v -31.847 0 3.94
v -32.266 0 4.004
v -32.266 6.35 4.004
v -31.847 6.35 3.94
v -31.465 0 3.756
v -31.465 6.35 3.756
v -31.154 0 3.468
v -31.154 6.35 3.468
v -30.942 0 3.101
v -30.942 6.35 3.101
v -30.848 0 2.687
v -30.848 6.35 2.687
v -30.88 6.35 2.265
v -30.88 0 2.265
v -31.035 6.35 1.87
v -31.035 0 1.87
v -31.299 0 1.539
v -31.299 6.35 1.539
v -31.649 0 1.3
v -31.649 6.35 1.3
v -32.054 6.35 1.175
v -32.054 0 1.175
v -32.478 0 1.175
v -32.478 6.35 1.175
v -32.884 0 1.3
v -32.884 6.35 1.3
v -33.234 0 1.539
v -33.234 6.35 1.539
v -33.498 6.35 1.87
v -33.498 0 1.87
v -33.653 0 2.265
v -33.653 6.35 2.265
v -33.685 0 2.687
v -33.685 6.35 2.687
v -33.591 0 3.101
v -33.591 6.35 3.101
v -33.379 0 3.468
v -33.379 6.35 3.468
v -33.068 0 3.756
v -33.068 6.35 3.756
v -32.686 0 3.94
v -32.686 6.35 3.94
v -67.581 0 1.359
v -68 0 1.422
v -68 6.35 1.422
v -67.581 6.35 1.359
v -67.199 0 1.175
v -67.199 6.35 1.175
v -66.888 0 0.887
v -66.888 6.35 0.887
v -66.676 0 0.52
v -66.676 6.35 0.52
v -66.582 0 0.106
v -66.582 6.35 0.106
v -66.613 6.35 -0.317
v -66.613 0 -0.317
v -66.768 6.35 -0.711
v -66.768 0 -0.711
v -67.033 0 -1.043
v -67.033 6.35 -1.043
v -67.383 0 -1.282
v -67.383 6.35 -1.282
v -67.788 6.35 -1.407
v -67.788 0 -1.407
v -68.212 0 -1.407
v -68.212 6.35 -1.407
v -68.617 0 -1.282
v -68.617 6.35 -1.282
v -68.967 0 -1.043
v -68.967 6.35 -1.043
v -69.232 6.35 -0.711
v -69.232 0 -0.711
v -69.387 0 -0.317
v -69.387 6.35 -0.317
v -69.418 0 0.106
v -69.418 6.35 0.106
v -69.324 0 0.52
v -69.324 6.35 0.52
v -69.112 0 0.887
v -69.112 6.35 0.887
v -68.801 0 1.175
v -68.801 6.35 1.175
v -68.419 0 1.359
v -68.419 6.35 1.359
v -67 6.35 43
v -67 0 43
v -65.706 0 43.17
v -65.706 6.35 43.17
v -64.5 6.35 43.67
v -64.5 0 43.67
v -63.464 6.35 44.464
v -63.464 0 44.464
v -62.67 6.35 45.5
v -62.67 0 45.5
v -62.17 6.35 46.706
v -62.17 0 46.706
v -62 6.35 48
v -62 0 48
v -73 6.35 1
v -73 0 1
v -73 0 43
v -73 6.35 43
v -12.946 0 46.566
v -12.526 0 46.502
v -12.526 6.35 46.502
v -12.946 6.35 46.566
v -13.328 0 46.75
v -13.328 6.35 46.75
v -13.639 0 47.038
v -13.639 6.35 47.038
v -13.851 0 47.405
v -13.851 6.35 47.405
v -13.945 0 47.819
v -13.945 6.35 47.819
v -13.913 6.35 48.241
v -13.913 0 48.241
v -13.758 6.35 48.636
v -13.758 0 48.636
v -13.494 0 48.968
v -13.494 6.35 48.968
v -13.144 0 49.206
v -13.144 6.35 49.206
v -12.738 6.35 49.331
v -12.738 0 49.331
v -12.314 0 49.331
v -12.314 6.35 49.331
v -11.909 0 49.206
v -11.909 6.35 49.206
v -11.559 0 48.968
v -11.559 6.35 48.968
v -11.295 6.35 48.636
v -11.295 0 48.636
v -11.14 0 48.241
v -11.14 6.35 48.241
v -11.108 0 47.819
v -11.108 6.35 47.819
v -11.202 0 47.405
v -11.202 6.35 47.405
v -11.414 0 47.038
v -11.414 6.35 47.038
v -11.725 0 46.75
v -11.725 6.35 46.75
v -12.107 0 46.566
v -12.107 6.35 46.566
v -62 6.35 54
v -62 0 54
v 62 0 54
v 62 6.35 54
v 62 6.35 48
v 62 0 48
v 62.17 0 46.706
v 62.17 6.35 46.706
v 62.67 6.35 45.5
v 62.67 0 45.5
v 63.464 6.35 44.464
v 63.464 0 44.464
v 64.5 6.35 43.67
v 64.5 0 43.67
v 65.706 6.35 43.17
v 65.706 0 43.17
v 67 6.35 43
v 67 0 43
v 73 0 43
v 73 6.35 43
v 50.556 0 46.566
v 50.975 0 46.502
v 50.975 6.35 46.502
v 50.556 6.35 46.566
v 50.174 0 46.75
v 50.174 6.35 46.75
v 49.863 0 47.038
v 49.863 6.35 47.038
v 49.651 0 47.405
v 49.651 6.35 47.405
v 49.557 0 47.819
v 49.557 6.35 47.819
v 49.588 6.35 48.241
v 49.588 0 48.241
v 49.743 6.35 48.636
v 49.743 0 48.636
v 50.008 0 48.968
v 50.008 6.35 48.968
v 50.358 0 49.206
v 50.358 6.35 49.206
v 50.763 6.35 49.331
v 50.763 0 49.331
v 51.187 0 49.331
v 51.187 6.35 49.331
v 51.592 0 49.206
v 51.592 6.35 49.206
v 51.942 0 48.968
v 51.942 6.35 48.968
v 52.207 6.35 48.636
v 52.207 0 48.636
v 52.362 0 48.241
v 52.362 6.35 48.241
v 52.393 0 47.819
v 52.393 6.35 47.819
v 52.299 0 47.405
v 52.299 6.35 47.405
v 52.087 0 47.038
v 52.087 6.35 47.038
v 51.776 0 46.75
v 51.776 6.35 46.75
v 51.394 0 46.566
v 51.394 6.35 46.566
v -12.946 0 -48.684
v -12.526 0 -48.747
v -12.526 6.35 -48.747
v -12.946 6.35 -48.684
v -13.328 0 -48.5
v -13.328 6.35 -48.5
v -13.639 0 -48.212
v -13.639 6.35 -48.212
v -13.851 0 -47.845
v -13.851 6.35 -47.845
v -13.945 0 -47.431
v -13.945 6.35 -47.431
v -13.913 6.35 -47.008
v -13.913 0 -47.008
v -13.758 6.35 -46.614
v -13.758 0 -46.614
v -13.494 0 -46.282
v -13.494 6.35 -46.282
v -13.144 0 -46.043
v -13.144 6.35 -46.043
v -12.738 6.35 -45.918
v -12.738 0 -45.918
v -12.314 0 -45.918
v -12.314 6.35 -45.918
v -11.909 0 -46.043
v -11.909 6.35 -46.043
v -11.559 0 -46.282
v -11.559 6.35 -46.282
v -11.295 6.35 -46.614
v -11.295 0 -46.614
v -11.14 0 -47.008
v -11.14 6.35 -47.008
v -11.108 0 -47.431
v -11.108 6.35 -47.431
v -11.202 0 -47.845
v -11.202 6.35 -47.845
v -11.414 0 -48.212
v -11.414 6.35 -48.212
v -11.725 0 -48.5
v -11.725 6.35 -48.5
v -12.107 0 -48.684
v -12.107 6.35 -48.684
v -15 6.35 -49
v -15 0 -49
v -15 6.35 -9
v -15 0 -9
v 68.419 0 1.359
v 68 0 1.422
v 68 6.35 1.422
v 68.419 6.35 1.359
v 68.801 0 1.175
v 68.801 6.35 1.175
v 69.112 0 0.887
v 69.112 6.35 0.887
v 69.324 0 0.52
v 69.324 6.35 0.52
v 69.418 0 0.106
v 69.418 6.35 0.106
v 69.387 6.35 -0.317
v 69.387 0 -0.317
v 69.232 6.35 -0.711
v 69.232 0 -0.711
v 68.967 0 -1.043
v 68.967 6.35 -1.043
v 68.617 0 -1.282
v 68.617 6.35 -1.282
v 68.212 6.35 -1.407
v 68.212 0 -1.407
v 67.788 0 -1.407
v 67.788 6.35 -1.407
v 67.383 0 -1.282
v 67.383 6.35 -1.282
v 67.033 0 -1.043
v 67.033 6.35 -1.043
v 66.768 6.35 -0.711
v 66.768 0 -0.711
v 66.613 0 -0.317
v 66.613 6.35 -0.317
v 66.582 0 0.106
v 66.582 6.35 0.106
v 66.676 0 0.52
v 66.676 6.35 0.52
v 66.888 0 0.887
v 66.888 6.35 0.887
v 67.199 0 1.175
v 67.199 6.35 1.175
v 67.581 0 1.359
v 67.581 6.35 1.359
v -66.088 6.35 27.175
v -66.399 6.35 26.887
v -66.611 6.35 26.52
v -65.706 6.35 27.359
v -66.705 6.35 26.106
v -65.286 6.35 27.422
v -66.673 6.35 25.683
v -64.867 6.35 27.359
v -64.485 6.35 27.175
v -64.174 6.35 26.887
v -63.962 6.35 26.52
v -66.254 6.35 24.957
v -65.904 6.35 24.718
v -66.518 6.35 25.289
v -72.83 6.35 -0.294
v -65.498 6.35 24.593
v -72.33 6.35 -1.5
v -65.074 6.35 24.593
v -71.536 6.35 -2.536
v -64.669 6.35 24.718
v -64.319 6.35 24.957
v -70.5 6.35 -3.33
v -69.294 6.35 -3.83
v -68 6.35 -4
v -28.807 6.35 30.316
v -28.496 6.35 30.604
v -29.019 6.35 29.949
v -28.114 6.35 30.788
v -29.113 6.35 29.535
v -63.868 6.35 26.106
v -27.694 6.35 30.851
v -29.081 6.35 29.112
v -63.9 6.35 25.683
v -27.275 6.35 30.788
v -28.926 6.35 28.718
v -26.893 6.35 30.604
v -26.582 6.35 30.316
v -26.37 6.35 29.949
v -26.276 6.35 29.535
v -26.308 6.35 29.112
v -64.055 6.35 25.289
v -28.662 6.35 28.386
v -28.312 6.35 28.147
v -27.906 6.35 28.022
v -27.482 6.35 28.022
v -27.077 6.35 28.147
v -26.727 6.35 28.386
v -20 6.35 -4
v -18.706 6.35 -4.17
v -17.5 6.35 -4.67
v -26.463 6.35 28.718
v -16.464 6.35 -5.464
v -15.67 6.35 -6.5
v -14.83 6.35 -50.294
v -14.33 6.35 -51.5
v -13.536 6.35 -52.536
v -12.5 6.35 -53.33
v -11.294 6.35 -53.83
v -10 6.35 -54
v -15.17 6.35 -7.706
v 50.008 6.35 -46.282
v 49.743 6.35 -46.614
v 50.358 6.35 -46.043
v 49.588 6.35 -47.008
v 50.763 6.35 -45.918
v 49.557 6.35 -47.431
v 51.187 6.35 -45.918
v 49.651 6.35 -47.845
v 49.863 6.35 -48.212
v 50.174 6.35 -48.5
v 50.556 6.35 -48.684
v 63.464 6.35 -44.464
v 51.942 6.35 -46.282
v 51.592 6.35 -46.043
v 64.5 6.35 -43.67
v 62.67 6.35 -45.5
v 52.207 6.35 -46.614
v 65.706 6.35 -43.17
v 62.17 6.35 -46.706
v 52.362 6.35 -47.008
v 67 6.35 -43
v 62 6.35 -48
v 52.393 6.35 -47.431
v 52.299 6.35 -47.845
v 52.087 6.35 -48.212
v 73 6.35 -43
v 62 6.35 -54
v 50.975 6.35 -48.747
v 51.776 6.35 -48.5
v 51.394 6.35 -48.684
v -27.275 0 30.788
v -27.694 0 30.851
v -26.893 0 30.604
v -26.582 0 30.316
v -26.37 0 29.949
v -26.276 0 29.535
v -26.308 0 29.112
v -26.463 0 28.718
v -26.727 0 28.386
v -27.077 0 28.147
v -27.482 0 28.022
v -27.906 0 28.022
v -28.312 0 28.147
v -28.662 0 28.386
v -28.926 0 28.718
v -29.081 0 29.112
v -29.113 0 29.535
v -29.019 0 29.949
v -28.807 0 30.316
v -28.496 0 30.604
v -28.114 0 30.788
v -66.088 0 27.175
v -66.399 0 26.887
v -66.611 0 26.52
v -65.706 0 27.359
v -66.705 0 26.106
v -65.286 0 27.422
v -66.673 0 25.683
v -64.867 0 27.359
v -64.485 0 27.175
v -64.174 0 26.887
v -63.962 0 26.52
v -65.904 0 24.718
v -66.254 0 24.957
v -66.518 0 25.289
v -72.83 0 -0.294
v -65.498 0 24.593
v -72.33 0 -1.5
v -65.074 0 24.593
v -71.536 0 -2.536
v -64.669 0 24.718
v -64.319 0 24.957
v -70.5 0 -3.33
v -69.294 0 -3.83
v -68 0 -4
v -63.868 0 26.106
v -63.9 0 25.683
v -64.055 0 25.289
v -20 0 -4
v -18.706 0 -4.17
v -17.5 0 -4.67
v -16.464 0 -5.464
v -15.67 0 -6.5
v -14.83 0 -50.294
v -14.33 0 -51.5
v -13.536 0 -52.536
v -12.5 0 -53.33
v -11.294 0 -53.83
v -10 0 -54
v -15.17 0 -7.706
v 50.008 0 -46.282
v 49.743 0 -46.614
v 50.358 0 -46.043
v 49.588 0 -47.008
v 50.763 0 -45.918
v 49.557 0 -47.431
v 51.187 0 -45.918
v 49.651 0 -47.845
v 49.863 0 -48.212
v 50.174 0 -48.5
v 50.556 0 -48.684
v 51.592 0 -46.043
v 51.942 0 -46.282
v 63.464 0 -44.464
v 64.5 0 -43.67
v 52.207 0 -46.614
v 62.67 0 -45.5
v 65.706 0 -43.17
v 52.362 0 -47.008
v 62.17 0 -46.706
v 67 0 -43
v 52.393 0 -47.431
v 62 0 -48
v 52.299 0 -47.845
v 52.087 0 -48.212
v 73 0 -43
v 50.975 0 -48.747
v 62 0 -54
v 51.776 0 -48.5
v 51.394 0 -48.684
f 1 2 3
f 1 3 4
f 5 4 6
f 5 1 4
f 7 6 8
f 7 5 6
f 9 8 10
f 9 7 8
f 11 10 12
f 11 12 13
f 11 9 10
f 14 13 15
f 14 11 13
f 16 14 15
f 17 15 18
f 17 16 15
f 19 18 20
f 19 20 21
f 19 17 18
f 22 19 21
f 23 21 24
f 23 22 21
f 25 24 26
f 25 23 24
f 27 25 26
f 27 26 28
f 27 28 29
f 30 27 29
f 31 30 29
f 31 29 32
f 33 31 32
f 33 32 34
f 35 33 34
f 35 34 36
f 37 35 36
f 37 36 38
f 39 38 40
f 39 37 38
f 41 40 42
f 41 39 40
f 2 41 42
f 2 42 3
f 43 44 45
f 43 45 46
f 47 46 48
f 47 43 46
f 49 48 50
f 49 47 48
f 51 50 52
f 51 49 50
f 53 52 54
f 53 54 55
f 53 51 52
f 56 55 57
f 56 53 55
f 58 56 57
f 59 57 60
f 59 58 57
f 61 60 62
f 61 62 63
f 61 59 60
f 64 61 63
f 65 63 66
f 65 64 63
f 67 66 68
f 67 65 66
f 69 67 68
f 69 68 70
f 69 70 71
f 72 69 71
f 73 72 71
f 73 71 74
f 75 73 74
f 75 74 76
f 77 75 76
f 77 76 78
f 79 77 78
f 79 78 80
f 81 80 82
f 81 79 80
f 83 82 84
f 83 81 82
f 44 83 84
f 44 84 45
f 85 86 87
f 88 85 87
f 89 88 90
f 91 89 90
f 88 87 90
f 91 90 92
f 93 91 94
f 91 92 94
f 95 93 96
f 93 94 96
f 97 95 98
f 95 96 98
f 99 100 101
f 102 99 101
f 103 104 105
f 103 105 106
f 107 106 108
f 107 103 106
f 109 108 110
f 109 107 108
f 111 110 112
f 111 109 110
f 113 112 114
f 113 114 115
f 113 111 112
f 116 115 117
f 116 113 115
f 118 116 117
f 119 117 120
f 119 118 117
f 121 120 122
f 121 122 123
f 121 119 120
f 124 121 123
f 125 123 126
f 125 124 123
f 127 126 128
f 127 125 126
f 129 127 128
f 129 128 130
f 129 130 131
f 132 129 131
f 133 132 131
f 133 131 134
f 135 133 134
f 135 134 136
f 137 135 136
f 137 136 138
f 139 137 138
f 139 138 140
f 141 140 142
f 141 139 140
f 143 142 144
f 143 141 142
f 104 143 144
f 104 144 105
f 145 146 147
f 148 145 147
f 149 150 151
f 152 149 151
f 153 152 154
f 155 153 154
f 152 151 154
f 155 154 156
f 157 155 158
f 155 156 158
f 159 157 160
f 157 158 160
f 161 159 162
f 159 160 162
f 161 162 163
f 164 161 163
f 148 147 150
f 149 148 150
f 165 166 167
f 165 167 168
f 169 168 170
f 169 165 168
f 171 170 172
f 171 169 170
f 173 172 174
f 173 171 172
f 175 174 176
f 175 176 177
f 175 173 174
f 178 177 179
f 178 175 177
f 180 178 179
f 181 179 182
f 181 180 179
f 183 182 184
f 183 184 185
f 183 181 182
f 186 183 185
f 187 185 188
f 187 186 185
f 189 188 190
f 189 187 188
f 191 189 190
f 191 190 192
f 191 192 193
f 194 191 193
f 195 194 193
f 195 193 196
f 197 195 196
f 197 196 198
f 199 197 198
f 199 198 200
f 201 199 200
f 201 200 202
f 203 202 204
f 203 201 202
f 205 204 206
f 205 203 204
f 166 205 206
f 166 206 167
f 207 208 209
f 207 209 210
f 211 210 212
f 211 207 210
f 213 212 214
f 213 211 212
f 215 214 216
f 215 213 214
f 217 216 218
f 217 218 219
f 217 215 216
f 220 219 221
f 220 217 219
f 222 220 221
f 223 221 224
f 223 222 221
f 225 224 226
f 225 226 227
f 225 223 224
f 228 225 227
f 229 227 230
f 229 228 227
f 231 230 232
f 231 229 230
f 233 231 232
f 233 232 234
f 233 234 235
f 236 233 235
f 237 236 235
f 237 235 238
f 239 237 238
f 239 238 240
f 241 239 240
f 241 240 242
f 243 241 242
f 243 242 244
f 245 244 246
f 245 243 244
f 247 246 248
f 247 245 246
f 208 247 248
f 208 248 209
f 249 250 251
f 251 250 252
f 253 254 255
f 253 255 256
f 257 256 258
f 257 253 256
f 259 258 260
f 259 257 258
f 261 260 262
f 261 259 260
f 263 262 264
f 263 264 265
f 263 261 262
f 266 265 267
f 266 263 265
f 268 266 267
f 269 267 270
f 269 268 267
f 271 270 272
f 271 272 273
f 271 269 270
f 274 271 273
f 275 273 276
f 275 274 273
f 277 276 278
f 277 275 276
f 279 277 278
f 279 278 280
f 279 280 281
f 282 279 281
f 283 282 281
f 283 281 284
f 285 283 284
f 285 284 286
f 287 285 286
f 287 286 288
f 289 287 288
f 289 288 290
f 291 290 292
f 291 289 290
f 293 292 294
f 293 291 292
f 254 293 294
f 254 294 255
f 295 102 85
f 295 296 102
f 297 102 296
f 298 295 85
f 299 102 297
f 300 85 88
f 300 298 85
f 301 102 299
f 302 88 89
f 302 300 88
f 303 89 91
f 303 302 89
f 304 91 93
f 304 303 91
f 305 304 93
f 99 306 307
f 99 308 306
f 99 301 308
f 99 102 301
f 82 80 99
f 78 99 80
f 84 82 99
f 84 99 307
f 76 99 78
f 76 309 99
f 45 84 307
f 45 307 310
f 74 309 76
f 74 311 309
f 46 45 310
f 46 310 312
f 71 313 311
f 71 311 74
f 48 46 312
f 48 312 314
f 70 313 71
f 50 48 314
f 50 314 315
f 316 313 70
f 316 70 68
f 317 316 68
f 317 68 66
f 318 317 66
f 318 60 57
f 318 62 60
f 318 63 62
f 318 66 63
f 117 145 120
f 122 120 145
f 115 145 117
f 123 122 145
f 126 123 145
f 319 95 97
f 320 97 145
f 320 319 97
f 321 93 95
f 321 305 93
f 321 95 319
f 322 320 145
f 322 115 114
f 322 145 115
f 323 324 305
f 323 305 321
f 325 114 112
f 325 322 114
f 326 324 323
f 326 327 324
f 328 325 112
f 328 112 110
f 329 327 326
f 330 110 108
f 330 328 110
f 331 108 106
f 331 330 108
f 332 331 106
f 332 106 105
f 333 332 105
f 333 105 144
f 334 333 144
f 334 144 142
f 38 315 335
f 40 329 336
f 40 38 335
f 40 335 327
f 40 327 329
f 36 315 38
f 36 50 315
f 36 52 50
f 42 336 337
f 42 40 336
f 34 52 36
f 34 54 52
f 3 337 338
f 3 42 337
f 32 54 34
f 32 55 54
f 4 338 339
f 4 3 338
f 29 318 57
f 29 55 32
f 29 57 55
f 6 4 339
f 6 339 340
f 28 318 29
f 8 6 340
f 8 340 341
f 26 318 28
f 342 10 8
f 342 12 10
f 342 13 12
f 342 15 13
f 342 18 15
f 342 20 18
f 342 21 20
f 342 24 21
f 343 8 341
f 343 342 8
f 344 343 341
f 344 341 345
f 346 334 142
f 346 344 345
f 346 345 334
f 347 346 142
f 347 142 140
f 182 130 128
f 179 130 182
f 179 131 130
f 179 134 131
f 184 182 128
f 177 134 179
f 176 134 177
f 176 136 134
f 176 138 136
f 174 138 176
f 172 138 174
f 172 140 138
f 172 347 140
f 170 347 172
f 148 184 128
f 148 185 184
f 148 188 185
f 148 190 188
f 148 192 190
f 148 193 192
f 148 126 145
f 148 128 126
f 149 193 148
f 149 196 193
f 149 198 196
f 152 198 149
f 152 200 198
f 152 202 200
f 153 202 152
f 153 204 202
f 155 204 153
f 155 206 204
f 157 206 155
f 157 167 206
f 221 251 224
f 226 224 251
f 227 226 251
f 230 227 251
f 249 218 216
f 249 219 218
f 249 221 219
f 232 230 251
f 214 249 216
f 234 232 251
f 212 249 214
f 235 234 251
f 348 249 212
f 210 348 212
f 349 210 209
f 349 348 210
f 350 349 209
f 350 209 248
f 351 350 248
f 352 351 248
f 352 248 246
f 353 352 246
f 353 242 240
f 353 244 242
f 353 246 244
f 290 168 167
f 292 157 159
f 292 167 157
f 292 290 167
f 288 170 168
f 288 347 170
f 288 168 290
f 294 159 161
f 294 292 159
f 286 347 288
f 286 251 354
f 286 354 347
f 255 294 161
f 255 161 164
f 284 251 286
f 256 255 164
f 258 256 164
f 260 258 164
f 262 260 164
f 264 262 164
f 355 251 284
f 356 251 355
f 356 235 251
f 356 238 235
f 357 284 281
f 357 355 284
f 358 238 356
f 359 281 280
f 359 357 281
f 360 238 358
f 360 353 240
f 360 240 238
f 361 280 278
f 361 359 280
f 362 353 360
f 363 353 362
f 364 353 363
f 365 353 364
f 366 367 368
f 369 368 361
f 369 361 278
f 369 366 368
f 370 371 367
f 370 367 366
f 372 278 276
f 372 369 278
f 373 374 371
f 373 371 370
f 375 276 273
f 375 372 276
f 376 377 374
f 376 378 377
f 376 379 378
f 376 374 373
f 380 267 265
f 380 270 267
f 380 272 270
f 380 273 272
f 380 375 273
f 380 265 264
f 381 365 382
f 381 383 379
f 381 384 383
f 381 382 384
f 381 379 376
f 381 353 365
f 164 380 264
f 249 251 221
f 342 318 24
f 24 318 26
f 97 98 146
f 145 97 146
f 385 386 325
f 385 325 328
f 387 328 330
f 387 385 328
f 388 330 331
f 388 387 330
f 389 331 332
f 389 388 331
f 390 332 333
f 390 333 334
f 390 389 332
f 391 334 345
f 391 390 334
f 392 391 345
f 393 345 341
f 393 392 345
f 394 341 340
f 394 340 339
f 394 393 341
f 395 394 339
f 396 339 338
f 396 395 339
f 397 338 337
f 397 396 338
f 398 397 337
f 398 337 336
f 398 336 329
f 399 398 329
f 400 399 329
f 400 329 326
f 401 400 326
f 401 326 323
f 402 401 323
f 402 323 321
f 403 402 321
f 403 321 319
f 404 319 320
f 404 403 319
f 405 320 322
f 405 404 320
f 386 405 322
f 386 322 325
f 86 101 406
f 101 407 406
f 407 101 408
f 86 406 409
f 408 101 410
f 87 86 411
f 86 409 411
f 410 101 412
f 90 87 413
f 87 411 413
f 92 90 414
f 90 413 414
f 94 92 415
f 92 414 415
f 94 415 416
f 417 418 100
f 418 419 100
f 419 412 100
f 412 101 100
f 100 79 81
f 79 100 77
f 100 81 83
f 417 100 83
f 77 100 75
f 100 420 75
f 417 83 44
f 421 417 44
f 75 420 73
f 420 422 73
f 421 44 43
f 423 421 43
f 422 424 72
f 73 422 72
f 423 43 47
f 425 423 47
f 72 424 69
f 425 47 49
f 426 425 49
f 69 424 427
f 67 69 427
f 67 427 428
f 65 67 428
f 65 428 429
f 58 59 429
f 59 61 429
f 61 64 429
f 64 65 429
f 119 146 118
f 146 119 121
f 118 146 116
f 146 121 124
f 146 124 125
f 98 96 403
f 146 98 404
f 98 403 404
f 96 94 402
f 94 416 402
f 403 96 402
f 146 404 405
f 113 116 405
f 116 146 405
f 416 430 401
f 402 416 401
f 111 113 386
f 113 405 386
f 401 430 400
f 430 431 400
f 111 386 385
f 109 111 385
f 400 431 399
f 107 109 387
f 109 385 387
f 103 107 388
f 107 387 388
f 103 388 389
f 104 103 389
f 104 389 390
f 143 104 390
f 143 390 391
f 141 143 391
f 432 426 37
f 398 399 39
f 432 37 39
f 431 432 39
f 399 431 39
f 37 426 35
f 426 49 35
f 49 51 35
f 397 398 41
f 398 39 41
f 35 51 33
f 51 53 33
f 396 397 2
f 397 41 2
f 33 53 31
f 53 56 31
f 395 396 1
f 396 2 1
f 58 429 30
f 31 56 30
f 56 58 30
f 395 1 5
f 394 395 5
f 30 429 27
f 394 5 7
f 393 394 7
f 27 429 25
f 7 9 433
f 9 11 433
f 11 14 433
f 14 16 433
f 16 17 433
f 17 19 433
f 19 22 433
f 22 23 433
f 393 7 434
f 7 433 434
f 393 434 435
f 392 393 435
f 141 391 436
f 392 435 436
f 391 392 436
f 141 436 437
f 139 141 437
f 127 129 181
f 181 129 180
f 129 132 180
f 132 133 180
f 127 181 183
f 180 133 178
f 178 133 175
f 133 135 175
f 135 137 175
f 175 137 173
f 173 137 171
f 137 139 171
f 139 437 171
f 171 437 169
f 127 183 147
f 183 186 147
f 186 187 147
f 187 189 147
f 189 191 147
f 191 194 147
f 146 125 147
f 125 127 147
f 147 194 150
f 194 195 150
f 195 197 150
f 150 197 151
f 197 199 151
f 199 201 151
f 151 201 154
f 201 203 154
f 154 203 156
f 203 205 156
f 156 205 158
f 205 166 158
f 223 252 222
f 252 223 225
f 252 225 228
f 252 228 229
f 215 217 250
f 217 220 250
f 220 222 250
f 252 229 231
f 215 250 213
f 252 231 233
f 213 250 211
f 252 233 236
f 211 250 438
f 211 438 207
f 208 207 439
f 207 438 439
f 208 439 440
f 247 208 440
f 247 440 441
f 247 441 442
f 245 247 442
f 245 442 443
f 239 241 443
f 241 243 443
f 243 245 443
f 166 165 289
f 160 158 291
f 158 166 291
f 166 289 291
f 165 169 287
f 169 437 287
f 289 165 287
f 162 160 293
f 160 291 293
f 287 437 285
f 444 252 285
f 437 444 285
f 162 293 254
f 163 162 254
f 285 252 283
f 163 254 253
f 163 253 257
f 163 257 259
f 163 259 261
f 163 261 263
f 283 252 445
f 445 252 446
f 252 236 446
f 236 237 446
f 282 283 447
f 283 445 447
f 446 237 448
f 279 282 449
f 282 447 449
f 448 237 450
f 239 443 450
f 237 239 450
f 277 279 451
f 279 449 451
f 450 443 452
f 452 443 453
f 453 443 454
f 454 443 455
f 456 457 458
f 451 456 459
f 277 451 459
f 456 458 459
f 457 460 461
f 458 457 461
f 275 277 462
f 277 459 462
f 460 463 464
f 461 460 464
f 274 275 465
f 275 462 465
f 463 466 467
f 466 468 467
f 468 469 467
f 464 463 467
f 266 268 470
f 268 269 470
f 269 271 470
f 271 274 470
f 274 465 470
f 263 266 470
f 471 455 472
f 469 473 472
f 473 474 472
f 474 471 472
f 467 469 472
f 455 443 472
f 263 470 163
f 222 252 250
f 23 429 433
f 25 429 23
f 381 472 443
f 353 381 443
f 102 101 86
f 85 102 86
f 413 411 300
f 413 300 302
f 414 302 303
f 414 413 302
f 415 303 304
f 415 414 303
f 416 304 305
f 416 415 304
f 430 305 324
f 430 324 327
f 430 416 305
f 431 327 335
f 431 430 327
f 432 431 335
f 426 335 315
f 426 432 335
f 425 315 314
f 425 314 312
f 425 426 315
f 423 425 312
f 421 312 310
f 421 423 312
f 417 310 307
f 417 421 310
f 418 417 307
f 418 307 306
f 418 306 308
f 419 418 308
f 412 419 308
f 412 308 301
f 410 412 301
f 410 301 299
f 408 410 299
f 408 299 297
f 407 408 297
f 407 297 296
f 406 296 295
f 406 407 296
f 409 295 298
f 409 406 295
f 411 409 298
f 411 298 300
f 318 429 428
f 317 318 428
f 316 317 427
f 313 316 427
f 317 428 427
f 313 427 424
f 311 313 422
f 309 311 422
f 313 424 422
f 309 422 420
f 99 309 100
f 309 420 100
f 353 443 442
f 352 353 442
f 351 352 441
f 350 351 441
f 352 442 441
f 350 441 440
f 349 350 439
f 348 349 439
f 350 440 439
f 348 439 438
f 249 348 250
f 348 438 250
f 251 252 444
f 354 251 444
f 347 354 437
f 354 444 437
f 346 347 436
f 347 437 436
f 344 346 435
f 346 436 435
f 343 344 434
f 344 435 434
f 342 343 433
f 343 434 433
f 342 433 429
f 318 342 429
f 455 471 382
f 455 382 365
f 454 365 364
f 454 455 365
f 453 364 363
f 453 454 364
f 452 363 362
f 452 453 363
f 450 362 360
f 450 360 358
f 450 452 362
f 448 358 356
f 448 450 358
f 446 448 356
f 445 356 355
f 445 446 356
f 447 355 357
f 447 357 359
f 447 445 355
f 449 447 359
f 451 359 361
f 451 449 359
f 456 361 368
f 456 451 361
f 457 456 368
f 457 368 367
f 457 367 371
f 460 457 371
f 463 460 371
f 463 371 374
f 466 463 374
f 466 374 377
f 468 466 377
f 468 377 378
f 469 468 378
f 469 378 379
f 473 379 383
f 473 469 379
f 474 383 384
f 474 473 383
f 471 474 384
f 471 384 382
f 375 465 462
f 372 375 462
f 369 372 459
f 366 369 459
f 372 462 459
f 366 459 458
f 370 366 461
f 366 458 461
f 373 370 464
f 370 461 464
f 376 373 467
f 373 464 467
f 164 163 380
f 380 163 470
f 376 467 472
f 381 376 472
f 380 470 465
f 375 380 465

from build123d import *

# Parameters (mm, degrees)
SKETCH1_R           = 1.4224
BOSS_EXTRUDE1_DEPTH = 6.35


with BuildPart() as part:
    # Sketch1 → Boss-Extrude1 (new body)
    with BuildSketch(Plane(origin=(0, 0, 0), x_dir=(1, 0, 0), z_dir=(0, 1, 0))):
        with BuildLine():
            Line((-73, -1), (-73, -43))
            Line((-73, -43), (-67, -43))
            ThreePointArc((-67, -43), (-63.464466094, -44.464466094), (-62, -48))
            Line((-62, -48), (-62, -54))
            Line((-62, -54), (62, -54))
            Line((62, -54), (62, -48))
            ThreePointArc((62, -48), (63.464466094, -44.464466094), (67, -43))
            Line((67, -43), (73, -43))
            Line((73, -43), (73, 43))
            Line((73, 43), (67, 43))
            ThreePointArc((67, 43), (63.464466094, 44.464466094), (62, 48))
            Line((62, 48), (62, 54))
            Line((62, 54), (-10, 54))
            ThreePointArc((-10, 54), (-13.535533906, 52.535533906), (-15, 49))
            Line((-15, 49), (-15, 9))
            ThreePointArc((-15, 9), (-16.464466094, 5.464466094), (-20, 4))
            Line((-20, 4), (-68, 4))
            ThreePointArc((-68, 4), (-71.535533906, 2.535533906), (-73, -1))
        make_face()
        with Locations(Location((68, 0, 0), (0, 0, 270))):
            Circle(SKETCH1_R, mode=Mode.SUBTRACT)
        with Locations(Location((-68, 0, 0), (0, 0, 270))):
            Circle(SKETCH1_R, mode=Mode.SUBTRACT)
        with Locations(Location((-27.69442531, -29.429, 0), (0, 0, 270))):
            Circle(SKETCH1_R, mode=Mode.SUBTRACT)
        with Locations(Location((-65.28642531, -26, 0), (0, 0, 270))):
            Circle(SKETCH1_R, mode=Mode.SUBTRACT)
        with Locations(Location((-32.26642531, -2.5812, 0), (0, 0, 270))):
            Circle(SKETCH1_R, mode=Mode.SUBTRACT)
        with Locations(Location((-12.52642531, -47.924899665, 0), (0, 0, 90))):
            Circle(SKETCH1_R, mode=Mode.SUBTRACT)
        with Locations(Location((50.975, -47.924899665, 0), (0, 0, 90))):
            Circle(SKETCH1_R, mode=Mode.SUBTRACT)
        with Locations(Location((-12.52642531, 47.325, 0), (0, 0, 90))):
            Circle(SKETCH1_R, mode=Mode.SUBTRACT)
        with Locations(Location((50.975, 47.325, 0), (0, 0, 90))):
            Circle(SKETCH1_R, mode=Mode.SUBTRACT)
    extrude(amount=BOSS_EXTRUDE1_DEPTH)


solid = part.part
